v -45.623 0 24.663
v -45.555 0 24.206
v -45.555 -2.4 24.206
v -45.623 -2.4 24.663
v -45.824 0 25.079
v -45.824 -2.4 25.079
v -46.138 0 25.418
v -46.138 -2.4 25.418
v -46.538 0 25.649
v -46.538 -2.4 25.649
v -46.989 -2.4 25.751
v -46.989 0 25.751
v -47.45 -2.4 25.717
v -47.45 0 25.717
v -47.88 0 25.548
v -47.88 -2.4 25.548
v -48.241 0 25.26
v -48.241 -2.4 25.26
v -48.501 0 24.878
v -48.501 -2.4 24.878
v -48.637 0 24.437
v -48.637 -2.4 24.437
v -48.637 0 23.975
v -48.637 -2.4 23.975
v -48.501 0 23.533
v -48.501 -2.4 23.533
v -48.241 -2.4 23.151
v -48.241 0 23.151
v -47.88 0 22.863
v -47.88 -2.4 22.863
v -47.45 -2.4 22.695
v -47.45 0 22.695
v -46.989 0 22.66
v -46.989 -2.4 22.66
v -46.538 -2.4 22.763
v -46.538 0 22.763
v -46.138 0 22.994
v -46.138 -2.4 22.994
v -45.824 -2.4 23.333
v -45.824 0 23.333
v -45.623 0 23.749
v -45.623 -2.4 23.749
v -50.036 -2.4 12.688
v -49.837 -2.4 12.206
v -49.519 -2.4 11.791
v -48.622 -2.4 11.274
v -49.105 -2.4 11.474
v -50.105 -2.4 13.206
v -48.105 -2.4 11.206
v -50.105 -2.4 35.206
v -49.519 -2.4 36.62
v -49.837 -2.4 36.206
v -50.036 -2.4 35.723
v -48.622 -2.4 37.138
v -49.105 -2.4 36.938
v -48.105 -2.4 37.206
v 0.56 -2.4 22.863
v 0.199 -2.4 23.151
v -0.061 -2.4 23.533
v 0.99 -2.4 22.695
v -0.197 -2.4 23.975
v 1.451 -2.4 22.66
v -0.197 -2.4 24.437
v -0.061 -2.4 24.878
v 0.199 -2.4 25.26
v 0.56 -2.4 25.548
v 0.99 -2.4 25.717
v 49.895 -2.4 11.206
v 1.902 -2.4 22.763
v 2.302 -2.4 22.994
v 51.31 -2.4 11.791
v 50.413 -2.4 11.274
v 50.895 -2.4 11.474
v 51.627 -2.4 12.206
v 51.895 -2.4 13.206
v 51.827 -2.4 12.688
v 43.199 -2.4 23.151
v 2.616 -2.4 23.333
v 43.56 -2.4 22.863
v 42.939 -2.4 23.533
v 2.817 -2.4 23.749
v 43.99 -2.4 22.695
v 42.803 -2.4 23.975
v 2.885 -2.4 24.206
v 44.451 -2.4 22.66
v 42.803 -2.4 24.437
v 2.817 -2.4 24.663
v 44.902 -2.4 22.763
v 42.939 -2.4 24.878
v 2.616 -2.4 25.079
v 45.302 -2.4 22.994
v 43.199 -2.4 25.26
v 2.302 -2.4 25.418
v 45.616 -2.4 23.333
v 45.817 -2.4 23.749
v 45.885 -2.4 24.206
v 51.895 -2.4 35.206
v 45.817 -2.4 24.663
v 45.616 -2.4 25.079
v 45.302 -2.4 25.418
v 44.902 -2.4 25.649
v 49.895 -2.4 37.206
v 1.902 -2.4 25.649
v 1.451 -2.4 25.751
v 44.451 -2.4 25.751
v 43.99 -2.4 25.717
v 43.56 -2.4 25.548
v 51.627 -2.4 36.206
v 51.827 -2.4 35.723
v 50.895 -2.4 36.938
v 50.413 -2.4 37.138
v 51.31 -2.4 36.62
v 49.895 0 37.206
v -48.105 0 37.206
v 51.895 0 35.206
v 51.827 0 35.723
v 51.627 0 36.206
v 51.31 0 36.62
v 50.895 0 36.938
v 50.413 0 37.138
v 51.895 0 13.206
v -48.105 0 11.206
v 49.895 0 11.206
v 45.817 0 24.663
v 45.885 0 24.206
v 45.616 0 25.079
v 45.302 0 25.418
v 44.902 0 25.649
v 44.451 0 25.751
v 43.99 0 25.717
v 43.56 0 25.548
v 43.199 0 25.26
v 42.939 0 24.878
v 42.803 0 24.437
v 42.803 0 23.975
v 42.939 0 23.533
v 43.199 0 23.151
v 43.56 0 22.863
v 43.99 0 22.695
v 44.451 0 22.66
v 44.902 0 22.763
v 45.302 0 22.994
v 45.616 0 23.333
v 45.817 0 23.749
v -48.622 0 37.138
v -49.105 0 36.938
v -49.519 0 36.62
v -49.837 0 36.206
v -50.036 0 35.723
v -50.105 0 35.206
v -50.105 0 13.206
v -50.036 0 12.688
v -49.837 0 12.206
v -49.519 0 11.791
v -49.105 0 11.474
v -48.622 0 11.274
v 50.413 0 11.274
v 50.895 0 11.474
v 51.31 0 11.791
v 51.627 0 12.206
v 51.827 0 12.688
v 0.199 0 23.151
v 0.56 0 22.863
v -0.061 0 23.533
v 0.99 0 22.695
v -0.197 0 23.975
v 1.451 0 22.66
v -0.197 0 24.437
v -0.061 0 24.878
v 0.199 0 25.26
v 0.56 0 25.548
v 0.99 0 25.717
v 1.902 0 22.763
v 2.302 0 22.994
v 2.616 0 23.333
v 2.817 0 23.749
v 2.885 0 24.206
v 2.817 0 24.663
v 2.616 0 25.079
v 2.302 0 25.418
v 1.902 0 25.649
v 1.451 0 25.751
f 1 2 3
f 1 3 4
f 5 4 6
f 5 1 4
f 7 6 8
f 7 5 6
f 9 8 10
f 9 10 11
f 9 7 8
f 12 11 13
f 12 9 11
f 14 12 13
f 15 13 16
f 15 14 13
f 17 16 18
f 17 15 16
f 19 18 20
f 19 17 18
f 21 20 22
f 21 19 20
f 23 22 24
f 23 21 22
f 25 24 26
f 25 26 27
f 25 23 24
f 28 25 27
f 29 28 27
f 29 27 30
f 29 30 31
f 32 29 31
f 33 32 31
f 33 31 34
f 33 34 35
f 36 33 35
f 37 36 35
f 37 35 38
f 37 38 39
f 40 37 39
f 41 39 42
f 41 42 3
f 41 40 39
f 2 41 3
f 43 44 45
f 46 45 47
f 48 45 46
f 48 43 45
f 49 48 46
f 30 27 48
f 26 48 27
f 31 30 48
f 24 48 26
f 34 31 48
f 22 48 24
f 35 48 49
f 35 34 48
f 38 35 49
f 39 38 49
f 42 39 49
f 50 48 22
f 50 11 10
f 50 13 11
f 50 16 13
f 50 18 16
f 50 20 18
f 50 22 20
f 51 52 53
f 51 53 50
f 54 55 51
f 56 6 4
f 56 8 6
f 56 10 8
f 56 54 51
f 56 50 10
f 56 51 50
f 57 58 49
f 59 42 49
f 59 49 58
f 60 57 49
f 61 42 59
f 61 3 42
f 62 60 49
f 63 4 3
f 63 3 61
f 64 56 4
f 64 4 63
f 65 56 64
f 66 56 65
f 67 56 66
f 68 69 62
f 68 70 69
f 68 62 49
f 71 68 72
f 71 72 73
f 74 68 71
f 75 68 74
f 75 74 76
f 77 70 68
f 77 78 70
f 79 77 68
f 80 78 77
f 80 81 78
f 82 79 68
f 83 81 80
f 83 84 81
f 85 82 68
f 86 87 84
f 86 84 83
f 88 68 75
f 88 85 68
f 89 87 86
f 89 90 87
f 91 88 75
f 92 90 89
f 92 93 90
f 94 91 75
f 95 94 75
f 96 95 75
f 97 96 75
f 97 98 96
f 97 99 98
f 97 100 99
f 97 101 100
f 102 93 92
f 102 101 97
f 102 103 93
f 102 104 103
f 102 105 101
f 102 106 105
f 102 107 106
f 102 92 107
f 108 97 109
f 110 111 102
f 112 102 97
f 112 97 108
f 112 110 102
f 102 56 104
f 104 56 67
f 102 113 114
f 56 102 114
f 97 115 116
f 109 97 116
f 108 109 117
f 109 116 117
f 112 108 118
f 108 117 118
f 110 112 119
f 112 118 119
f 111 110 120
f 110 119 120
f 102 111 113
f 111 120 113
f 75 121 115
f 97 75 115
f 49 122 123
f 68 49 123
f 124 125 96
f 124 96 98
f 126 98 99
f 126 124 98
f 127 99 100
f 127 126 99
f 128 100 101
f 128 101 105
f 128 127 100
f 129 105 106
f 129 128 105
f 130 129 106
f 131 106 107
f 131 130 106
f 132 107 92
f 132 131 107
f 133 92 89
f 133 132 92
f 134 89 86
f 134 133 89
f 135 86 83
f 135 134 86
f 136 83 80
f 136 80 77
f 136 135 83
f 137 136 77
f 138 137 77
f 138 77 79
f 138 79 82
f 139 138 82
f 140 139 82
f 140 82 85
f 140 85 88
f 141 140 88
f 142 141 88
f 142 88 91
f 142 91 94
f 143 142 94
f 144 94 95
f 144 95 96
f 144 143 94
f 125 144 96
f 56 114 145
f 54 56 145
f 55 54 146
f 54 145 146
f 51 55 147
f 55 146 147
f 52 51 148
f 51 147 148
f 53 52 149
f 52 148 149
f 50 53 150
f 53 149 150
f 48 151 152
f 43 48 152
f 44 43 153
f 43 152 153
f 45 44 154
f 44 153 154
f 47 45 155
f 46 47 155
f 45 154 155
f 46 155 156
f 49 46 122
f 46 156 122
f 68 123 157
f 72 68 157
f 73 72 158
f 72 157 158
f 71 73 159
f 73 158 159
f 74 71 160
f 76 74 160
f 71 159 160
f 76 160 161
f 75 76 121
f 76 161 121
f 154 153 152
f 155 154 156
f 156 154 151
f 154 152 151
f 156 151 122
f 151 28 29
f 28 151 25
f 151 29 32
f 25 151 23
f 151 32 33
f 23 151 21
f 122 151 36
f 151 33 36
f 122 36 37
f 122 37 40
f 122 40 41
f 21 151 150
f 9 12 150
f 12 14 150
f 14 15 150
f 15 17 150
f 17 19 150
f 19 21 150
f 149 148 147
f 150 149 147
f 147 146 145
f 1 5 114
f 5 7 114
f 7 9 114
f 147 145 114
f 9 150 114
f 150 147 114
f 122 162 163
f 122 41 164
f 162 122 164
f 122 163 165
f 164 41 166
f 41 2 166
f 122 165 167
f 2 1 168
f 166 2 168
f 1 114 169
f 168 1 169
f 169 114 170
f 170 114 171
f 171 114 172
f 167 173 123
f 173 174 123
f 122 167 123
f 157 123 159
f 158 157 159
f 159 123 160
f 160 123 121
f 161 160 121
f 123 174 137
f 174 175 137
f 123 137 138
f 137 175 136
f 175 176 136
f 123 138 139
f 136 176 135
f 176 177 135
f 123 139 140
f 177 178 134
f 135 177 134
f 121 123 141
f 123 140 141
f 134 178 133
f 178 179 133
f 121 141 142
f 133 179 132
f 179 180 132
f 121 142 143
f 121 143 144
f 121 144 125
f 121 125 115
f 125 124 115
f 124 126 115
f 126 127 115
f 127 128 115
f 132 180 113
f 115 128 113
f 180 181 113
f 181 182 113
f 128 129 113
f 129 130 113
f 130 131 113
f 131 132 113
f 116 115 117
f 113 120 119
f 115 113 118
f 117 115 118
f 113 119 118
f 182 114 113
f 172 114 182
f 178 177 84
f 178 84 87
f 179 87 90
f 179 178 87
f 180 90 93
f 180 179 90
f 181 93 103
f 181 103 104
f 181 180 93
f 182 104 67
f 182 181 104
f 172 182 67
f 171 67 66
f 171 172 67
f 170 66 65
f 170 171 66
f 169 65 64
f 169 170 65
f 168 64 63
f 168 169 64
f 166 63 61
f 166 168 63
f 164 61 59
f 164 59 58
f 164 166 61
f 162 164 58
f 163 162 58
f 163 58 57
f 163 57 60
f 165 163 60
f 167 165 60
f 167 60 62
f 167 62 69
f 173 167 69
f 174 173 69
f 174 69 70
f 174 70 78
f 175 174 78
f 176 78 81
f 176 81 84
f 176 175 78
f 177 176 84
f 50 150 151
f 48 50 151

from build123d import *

# Parameters (mm, degrees)
F0_R     = 1.55
F1_DEPTH = 2.4


with BuildPart() as f1:
    # F0 (on Front) → F1 (new body)
    with BuildSketch(Plane.XZ):
        with BuildLine():
            Line((49.895372, 37.205682), (-48.104628, 37.205682))
            ThreePointArc((-48.104628, 37.205682), (-49.518842, 36.619896), (-50.104628, 35.205682))
            Line((-50.104628, 35.205682), (-50.104628, 13.205682))
            ThreePointArc((-50.104628, 13.205682), (-49.518842, 11.791469), (-48.104628, 11.205682))
            Line((-48.104628, 11.205682), (49.895372, 11.205682))
            ThreePointArc((49.895372, 11.205682), (51.309586, 11.791469), (51.895372, 13.205682))
            Line((51.895372, 13.205682), (51.895372, 35.205682))
            ThreePointArc((51.895372, 35.205682), (51.309586, 36.619896), (49.895372, 37.205682))
        make_face()
        with Locations((-47.104628, 24.205682)):
            Circle(F0_R, mode=Mode.SUBTRACT)
        with Locations((1.335372, 24.205682)):
            Circle(F0_R, mode=Mode.SUBTRACT)
        with Locations((44.335372, 24.205682)):
            Circle(F0_R, mode=Mode.SUBTRACT)
    extrude(amount=F1_DEPTH)


solid = f1.part
